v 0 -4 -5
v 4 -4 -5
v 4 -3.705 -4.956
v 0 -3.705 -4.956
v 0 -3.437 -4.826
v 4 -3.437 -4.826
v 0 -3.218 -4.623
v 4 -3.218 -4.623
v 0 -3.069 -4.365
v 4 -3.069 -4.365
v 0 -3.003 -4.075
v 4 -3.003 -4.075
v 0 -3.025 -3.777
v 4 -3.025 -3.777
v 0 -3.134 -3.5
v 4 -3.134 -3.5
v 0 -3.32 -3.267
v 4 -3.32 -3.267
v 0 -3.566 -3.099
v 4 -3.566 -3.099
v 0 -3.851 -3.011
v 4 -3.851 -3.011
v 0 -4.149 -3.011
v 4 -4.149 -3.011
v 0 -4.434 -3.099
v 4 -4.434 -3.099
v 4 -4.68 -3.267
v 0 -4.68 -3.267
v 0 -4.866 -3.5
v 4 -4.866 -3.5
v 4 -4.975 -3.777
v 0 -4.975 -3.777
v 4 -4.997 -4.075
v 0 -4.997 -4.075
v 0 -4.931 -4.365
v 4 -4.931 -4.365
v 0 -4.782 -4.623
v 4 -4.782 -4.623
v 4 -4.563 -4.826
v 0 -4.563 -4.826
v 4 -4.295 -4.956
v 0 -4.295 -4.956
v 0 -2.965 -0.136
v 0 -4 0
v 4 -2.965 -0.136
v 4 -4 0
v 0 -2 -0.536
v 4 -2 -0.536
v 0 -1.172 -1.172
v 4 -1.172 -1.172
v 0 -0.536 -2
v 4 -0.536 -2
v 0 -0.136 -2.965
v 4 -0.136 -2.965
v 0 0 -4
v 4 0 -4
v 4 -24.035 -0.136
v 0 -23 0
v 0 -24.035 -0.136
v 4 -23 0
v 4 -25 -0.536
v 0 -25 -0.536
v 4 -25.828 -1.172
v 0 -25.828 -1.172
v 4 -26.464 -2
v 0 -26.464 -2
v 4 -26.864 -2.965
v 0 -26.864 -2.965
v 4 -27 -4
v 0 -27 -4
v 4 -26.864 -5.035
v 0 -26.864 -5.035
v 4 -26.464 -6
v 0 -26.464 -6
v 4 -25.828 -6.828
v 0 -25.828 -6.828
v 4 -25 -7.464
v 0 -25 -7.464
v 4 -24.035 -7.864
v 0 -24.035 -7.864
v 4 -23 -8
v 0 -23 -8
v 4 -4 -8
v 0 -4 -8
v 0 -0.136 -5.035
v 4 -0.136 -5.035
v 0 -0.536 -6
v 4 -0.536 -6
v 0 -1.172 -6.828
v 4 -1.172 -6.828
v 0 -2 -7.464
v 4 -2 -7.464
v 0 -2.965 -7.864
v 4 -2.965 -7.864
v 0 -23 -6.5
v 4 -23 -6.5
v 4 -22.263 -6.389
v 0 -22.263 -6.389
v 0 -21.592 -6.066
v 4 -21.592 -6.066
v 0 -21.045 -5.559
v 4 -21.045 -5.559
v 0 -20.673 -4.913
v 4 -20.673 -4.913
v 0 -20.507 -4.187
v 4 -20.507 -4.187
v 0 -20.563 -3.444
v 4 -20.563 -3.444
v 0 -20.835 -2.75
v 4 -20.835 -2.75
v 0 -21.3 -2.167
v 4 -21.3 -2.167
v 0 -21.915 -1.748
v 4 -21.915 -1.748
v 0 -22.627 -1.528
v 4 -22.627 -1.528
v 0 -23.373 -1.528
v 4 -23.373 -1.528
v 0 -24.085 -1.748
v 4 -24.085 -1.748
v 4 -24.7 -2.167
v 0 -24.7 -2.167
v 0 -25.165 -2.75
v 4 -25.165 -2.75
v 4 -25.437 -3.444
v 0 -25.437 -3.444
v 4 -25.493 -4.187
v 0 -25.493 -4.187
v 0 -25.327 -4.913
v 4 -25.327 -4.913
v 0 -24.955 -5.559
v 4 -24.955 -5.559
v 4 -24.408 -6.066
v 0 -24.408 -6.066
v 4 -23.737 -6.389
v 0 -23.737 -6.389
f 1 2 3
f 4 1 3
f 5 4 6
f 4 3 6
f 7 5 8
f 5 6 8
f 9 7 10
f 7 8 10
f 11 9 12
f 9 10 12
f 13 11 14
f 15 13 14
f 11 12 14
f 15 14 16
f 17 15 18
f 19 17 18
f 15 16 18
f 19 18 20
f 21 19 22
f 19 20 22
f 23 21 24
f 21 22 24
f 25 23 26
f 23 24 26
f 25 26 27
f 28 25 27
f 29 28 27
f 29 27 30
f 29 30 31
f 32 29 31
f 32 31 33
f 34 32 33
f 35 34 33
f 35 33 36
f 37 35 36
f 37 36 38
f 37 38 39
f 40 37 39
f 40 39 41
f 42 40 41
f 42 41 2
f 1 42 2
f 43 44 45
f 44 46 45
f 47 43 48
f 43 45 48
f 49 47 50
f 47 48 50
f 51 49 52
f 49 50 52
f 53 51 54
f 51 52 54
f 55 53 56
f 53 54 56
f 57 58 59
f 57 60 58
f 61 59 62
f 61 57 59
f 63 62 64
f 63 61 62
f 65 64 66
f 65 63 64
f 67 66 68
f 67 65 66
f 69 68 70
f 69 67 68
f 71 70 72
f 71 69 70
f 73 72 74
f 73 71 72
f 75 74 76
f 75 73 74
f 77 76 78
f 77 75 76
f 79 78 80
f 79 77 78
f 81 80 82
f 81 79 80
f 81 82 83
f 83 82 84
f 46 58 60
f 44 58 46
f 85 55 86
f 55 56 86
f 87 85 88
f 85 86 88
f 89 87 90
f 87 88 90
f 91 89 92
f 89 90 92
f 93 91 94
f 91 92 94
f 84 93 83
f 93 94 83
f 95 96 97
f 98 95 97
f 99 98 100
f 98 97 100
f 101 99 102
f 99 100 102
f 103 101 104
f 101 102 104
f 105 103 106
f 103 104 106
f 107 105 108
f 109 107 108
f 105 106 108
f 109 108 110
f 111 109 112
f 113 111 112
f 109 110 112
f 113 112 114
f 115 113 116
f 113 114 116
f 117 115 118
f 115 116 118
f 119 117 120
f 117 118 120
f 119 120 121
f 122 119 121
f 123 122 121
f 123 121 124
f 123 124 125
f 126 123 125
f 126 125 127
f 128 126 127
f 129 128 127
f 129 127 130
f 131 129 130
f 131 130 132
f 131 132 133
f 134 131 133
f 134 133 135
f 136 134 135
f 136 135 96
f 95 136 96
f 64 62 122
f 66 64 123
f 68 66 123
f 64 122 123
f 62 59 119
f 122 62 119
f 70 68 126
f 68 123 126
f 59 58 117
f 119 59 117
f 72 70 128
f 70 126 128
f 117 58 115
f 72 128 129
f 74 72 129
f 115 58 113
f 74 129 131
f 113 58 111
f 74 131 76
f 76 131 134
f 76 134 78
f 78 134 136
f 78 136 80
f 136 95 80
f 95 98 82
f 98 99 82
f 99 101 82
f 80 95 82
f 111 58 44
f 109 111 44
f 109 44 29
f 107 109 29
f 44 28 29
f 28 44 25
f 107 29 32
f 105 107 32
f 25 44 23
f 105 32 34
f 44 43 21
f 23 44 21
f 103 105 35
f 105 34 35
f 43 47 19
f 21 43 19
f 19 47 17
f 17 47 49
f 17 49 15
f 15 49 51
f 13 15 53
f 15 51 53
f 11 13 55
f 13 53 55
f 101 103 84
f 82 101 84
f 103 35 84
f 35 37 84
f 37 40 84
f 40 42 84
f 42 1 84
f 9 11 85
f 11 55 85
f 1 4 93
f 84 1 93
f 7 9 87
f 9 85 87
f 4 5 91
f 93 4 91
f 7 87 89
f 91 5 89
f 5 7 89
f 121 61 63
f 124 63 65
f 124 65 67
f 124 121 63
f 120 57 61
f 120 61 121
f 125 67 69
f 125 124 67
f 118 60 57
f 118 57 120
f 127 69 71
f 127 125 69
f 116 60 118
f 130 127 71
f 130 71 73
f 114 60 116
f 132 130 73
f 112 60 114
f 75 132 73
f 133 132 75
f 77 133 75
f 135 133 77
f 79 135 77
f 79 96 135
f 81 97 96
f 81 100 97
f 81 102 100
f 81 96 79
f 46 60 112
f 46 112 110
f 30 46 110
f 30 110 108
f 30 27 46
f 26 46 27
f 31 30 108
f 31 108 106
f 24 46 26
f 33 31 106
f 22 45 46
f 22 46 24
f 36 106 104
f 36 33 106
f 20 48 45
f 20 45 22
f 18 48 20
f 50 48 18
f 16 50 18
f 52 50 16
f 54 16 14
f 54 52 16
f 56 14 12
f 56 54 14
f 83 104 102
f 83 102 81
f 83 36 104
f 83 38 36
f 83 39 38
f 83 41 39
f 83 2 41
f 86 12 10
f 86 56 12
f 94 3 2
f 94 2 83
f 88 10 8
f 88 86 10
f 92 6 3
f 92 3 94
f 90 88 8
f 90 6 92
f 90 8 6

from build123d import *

# Parameters (mm, degrees)
SKETCH1_W           = 8
SKETCH1_H           = 27
BOSS_EXTRUDE1_DEPTH = 4
SKETCH2_R           = 2.5
SKETCH2_R_2         = 1
CUT_EXTRUDE1_DEPTH  = 29.442925307
FILLET1_R           = 4


with BuildPart() as part:
    # Sketch1 → Boss-Extrude1 (new body)
    with BuildSketch(Plane(origin=(0, 0, 0), x_dir=(0, 0, -1), z_dir=(1, 0, 0))):
        with Locations((4, -13.5)):
            Rectangle(SKETCH1_W, SKETCH1_H)
    extrude(amount=BOSS_EXTRUDE1_DEPTH)

    # Sketch2 → Cut-Extrude1 (cut, through all)
    with BuildSketch(Plane(origin=(4, 0, 0), x_dir=(0, 0, -1), z_dir=(1, 0, 0))):
        with Locations((4, -23)):
            Circle(SKETCH2_R)
        with Locations((4, -4)):
            Circle(SKETCH2_R_2)
    extrude(amount=-CUT_EXTRUDE1_DEPTH, mode=Mode.SUBTRACT)

    # Fillet1
    fillet1_edges = [part.edges().sort_by_distance(p)[0] for p in [
        (2, -27, -8),
        (2, -27, 0),
        (2, 0, 0),
        (2, 0, -8),
    ]]
    fillet(fillet1_edges, radius=FILLET1_R - 0.0001)  # a hair under: the kernel refuses the full size


solid = part.part
